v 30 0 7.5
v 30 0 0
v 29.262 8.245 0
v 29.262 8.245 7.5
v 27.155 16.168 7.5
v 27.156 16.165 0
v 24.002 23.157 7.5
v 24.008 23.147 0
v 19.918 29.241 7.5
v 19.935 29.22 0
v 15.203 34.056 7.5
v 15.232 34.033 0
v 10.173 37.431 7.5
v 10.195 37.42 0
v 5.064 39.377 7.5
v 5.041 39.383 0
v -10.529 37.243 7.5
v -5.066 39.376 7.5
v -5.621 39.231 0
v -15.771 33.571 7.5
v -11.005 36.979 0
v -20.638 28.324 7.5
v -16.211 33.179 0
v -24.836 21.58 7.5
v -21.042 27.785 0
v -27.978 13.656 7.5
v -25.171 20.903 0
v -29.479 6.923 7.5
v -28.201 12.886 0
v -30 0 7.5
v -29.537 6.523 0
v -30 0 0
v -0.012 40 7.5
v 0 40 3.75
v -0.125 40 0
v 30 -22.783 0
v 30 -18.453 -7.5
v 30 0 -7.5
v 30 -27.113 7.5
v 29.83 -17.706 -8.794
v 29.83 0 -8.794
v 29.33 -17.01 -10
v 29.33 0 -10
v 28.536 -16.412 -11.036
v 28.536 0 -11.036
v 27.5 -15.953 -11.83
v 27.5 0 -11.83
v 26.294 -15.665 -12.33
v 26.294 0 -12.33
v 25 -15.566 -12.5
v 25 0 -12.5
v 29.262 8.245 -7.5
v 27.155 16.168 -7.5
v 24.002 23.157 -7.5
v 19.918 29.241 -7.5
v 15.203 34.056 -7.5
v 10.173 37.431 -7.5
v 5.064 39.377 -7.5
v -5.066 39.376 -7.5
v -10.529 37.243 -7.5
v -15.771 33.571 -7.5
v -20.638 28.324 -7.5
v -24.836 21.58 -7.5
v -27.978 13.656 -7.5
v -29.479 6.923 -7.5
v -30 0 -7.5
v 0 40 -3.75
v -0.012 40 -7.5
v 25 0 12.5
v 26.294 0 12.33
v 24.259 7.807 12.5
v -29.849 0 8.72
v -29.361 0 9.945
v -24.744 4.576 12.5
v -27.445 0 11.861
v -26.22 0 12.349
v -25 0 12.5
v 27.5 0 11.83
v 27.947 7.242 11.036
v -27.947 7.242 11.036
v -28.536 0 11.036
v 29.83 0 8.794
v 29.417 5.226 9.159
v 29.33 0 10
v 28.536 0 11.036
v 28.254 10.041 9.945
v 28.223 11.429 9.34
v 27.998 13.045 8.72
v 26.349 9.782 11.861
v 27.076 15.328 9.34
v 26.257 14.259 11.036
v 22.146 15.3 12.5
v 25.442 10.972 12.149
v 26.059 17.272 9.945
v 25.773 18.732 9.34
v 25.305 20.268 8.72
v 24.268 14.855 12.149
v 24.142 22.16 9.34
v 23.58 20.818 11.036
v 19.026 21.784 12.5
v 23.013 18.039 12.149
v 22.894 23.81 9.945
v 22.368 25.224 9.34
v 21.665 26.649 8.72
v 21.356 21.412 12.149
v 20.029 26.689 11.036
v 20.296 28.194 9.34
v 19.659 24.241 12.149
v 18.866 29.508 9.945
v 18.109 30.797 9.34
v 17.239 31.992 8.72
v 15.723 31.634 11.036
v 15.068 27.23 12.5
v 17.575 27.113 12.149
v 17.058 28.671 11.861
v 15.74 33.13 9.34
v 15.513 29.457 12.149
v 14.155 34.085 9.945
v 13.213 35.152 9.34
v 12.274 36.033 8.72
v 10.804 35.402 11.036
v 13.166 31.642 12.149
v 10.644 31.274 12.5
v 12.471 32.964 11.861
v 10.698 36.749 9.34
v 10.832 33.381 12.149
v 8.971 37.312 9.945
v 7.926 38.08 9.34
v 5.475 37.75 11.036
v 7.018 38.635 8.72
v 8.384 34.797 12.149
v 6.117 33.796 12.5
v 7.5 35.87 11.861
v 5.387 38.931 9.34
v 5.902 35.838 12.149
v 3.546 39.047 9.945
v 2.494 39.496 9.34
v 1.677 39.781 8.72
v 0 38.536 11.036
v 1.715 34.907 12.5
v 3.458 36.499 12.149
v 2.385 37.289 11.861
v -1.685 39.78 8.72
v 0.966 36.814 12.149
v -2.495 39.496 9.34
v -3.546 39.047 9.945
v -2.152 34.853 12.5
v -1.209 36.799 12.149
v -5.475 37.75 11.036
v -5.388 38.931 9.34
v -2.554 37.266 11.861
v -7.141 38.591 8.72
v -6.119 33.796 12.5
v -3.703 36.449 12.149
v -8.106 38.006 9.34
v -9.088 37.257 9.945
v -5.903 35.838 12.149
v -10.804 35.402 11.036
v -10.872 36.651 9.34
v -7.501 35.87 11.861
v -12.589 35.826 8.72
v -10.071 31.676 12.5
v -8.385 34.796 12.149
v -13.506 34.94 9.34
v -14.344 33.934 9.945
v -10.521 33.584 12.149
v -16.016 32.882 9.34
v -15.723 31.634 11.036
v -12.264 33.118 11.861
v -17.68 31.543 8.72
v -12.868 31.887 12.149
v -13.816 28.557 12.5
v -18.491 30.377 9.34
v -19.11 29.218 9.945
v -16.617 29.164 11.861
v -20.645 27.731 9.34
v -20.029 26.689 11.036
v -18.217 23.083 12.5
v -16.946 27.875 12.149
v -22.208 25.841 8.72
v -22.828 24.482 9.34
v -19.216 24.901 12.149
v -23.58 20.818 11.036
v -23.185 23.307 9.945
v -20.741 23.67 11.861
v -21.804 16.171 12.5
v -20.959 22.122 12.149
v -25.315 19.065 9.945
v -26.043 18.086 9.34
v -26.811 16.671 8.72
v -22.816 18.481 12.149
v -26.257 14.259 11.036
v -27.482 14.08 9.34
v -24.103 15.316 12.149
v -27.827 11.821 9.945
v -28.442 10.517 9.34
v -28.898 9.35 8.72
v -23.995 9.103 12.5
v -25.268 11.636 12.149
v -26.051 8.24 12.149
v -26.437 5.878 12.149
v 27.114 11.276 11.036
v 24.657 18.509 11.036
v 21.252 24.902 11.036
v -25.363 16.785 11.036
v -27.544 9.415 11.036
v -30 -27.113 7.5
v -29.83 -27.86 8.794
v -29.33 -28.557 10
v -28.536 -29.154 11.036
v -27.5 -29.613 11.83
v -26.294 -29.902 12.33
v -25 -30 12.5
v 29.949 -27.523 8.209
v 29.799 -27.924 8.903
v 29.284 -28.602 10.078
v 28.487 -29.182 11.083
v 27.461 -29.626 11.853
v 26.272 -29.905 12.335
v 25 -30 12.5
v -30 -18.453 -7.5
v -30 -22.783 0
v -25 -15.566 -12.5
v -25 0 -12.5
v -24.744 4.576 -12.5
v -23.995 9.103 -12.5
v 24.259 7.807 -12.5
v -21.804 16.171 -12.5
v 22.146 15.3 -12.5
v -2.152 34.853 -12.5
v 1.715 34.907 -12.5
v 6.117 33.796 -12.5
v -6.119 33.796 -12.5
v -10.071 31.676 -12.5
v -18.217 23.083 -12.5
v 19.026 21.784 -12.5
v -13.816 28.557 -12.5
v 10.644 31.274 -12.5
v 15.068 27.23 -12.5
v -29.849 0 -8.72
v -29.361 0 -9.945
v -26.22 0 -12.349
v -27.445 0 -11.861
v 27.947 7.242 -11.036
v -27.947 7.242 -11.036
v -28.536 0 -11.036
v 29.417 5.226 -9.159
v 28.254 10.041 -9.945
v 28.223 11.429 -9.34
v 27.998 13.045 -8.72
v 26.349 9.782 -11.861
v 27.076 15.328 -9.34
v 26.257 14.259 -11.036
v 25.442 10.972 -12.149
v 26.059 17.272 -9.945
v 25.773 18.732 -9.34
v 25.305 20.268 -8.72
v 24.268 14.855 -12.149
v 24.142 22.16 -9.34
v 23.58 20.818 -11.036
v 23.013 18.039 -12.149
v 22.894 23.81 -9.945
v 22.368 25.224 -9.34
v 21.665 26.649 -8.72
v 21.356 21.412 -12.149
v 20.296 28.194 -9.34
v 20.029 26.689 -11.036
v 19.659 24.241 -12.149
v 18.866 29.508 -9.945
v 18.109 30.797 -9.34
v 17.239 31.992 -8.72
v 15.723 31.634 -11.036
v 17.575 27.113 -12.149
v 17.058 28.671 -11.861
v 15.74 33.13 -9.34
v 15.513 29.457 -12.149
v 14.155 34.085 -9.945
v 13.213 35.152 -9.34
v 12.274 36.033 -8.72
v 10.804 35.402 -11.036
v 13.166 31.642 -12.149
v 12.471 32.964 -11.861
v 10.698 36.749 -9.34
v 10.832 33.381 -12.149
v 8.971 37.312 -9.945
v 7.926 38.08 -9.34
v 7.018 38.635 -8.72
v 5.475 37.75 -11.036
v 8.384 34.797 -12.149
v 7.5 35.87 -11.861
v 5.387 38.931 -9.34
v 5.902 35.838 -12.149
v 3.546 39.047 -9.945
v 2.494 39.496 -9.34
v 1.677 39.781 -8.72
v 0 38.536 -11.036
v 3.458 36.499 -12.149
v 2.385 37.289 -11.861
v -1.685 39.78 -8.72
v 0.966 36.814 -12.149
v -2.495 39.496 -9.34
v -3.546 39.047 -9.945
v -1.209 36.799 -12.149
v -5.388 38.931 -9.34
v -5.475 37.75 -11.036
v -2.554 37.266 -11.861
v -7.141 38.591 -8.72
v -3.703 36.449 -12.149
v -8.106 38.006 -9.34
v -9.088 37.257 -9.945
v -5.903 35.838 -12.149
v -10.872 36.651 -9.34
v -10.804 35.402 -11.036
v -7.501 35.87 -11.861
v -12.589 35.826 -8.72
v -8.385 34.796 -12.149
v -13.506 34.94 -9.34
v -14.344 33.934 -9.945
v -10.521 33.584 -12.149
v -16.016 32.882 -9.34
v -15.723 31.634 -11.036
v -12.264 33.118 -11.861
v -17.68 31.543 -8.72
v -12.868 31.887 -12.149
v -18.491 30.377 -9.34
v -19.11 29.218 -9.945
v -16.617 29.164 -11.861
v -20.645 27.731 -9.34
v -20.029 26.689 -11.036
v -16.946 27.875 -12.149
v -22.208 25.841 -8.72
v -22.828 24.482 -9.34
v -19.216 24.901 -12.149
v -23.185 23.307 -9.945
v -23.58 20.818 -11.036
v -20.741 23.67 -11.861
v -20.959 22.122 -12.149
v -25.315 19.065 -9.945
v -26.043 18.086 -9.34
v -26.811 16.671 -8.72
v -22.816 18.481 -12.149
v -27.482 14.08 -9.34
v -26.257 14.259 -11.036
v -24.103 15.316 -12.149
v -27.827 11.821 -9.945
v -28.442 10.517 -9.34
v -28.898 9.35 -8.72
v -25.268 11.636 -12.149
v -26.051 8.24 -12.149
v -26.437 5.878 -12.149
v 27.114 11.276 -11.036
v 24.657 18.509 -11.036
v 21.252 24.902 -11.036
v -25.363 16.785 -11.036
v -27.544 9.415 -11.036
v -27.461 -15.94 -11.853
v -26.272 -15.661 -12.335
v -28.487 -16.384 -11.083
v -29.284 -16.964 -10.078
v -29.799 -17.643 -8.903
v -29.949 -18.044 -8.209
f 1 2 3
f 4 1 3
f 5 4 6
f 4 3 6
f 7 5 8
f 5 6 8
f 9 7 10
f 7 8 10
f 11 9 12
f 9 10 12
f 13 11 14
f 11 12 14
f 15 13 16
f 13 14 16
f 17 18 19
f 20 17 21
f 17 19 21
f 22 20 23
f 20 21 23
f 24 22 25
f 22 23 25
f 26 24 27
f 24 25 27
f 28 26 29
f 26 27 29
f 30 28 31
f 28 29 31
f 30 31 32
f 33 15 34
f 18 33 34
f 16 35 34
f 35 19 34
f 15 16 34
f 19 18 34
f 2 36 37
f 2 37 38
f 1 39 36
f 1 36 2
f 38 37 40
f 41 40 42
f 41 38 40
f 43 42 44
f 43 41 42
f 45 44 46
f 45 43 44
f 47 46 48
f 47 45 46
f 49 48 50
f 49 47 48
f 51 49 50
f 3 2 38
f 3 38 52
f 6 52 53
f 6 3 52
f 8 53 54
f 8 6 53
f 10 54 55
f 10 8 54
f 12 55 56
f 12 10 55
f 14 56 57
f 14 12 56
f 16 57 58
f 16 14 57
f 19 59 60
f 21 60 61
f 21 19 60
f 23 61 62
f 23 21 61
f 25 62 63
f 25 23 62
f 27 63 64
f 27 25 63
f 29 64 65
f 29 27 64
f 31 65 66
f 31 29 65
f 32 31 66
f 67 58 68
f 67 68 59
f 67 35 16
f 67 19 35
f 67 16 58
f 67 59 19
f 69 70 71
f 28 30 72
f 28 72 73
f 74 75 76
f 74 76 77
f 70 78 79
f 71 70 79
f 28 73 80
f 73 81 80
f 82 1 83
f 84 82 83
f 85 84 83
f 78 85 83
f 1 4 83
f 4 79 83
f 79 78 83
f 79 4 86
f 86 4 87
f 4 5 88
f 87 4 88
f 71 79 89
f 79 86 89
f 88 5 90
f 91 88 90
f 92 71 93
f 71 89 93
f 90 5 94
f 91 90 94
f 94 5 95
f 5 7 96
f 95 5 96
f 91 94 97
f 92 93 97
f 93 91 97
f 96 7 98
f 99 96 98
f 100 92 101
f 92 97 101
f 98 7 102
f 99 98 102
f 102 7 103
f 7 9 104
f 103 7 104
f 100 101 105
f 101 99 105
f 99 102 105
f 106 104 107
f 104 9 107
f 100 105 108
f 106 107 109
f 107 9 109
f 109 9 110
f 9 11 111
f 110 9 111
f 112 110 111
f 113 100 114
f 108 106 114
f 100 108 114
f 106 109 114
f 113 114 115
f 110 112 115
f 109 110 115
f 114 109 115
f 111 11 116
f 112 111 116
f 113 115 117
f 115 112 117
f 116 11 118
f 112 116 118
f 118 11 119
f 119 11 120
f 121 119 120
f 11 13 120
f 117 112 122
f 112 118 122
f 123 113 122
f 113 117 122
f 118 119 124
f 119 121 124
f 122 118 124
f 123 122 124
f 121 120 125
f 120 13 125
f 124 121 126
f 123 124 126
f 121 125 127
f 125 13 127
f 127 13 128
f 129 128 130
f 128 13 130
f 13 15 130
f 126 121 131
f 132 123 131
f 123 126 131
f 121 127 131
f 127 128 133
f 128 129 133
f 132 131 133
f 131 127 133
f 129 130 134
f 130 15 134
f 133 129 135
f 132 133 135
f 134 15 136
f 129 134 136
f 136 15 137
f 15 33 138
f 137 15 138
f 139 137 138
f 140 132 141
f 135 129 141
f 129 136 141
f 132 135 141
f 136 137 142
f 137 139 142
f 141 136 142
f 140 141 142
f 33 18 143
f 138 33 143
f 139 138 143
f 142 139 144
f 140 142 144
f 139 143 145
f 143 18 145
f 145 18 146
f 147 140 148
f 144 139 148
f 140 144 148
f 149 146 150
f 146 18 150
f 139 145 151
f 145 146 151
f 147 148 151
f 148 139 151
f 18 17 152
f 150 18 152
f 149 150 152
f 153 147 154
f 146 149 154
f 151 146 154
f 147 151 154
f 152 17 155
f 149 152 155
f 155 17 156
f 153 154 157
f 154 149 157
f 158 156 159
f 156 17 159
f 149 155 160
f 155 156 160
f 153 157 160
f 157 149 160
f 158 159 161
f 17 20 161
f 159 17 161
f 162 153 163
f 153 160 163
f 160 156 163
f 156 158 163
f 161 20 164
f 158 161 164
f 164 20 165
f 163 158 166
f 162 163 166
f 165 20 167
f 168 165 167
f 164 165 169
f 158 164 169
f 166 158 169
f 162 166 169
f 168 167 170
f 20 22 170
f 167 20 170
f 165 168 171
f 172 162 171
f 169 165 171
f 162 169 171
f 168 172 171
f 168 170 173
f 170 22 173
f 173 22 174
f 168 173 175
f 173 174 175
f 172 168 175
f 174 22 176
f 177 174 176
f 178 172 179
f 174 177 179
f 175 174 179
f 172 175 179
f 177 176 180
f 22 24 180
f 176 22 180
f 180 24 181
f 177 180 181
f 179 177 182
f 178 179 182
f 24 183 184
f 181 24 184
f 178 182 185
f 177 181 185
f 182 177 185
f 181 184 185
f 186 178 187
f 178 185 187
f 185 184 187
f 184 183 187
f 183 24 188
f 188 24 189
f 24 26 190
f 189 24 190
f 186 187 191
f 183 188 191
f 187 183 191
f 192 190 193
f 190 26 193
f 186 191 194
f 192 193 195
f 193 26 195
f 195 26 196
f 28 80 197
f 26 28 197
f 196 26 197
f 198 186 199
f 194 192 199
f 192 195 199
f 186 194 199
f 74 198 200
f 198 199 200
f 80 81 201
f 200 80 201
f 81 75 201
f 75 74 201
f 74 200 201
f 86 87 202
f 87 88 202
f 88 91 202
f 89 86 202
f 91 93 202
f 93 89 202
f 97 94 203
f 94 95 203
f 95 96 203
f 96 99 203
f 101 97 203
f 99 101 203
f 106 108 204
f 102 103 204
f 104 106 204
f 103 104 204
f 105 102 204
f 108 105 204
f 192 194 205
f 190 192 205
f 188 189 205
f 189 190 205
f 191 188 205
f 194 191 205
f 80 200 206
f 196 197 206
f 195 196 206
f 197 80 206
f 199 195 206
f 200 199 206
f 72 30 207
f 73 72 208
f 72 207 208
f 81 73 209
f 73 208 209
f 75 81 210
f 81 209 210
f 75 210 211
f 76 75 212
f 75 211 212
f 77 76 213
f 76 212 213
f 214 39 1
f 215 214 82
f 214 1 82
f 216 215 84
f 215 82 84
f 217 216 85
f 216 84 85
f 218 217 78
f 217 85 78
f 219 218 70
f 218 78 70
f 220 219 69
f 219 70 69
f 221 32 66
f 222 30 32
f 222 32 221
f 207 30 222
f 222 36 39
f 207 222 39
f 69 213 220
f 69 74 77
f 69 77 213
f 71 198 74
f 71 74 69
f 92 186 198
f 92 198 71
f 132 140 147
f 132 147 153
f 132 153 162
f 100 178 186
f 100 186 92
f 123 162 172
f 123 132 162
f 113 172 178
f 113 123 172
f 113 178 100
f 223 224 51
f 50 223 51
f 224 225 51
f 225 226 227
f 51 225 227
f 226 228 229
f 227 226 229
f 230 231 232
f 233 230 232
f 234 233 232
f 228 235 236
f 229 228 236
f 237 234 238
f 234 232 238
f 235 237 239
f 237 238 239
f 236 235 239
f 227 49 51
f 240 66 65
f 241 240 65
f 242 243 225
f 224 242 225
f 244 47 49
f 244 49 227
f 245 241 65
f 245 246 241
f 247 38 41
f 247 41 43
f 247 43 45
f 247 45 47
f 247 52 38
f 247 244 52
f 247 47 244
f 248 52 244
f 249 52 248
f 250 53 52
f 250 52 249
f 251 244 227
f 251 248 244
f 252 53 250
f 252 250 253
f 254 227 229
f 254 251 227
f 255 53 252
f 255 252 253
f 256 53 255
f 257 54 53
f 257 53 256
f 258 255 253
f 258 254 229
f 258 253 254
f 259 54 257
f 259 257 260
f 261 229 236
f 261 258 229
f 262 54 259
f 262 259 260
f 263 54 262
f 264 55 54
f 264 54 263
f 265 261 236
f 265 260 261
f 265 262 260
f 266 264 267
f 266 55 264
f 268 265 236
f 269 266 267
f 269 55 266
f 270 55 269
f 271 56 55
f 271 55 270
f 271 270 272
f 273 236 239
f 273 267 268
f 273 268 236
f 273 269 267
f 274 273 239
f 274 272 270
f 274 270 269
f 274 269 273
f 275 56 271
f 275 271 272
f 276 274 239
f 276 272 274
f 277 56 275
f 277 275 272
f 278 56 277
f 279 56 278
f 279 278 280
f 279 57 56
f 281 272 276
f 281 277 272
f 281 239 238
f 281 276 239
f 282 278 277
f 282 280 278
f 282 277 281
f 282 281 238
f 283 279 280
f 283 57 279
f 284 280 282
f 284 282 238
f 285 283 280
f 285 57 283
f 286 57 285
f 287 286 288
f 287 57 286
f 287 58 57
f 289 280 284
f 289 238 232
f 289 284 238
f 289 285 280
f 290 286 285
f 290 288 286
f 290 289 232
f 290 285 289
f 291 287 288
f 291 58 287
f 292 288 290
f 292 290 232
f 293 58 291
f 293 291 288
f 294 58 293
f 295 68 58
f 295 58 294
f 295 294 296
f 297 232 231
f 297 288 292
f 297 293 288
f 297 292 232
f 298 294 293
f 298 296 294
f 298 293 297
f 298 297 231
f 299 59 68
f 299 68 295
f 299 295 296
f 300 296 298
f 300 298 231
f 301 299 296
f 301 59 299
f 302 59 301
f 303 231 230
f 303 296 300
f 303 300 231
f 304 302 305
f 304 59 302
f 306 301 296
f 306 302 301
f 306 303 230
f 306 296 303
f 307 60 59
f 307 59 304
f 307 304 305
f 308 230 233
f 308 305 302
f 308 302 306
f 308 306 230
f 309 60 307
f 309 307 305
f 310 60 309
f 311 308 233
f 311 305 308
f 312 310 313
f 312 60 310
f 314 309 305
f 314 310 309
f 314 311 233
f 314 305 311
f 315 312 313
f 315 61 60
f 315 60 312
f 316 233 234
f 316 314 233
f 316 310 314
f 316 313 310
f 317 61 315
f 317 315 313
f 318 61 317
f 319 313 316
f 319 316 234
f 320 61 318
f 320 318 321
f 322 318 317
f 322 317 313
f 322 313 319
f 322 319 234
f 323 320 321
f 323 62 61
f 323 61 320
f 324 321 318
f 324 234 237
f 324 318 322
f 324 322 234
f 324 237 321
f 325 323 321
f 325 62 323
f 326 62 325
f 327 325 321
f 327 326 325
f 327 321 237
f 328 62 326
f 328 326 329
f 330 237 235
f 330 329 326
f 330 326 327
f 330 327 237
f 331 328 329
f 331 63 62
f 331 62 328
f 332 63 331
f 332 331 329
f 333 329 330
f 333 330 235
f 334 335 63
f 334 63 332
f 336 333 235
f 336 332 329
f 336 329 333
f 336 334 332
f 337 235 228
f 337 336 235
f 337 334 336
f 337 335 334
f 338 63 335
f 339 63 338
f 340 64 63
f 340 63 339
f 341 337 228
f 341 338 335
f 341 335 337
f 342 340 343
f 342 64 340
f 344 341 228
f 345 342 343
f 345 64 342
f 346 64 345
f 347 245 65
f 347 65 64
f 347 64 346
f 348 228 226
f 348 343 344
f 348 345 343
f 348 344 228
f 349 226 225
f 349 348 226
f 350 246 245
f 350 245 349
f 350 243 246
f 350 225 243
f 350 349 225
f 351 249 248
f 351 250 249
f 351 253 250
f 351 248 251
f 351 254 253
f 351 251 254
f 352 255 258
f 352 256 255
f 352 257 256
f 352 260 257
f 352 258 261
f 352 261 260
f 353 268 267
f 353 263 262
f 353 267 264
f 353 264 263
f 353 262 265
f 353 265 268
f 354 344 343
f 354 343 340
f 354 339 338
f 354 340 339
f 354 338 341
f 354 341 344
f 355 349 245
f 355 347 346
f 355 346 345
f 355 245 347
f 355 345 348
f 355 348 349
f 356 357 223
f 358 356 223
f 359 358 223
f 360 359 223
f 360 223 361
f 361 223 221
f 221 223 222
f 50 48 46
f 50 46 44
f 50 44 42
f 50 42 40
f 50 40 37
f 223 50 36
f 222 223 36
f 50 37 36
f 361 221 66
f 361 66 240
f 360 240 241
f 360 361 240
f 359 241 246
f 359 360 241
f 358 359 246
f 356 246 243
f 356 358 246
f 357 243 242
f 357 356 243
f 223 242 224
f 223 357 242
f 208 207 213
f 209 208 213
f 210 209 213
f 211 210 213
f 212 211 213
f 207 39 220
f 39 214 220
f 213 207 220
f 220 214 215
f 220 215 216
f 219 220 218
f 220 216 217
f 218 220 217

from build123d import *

# Parameters (mm, degrees)
F1_DEPTH = 12.5
F2_R     = 5
F4_DEPTH = 30


with BuildPart() as f1:
    # F0 (on Top) → F1 (new body, symmetric)
    with BuildSketch(Plane.XY):
        with BuildLine():
            Line((-30, 2.9789e-06), (-30, -30))
            Line((-30, -30), (0, -30))
            ThreePointArc((0, -30), (-21.2132044888, -21.2132023824), (-30, 2.9789e-06))
        make_face()
        with BuildLine():
            ThreePointArc((30, 0), (21.2132034356, -21.2132034356), (0, -30))
            Line((0, -30), (30, -30))
            Line((30, -30), (30, 0))
        make_face()
        with BuildLine():
            ThreePointArc((-30, 2.9789e-06), (-21.2132044888, -21.2132023824), (0, -30))
            ThreePointArc((0, -30), (21.2132034356, -21.2132034356), (30, 0))
            ThreePointArc((30, 0), (1.4895e-06, 30), (-30, 2.9789e-06))
        make_face()
        with BuildLine():
            add(Edge.make_bspline(
                [(0, 40), (-16.629870981, 40), (-30, 20.0504878896), (-30, 2.9789e-06)],
                knots=[0, 0, 0, 0, 49.9999976168, 49.9999976168, 49.9999976168, 49.9999976168], degree=3))
            ThreePointArc((-30, 2.9789e-06), (1.4895e-06, 30), (30, 0))
            add(Edge.make_bspline(
                [(0, 40), (16.629870981, 40), (30, 20.0504849106), (30, 0)],
                knots=[0, 0, 0, 0, 50, 50, 50, 50], degree=3))
        make_face()
    extrude(amount=F1_DEPTH, both=True)

    # F2
    f2_edges = [f1.edges().sort_by_distance(p)[0] for p in [
        (30, -15, -12.5),
        (30, -15, 12.5),
        (-30, -14.999999, 12.5),
        (-30, -14.999999, -12.5),
    ]]
    fillet(f2_edges, radius=F2_R)

    # F3 (on Right) → F4 (cut, symmetric)
    with BuildSketch(Plane.YZ):
        Polygon((-15.5662432703, -12.5), (-22.7831216351, 0), (-30, 0), (-30, -12.5), align=None)
        Polygon((-30, 0), (-22.7831216351, 0), (-27.1132486541, 7.5), (-30, 7.5), align=None)
        Polygon((-30, 7.5), (-27.1132486541, 7.5), (-30, 12.5), align=None)
    extrude(amount=F4_DEPTH, both=True, mode=Mode.SUBTRACT)


solid = f1.part
